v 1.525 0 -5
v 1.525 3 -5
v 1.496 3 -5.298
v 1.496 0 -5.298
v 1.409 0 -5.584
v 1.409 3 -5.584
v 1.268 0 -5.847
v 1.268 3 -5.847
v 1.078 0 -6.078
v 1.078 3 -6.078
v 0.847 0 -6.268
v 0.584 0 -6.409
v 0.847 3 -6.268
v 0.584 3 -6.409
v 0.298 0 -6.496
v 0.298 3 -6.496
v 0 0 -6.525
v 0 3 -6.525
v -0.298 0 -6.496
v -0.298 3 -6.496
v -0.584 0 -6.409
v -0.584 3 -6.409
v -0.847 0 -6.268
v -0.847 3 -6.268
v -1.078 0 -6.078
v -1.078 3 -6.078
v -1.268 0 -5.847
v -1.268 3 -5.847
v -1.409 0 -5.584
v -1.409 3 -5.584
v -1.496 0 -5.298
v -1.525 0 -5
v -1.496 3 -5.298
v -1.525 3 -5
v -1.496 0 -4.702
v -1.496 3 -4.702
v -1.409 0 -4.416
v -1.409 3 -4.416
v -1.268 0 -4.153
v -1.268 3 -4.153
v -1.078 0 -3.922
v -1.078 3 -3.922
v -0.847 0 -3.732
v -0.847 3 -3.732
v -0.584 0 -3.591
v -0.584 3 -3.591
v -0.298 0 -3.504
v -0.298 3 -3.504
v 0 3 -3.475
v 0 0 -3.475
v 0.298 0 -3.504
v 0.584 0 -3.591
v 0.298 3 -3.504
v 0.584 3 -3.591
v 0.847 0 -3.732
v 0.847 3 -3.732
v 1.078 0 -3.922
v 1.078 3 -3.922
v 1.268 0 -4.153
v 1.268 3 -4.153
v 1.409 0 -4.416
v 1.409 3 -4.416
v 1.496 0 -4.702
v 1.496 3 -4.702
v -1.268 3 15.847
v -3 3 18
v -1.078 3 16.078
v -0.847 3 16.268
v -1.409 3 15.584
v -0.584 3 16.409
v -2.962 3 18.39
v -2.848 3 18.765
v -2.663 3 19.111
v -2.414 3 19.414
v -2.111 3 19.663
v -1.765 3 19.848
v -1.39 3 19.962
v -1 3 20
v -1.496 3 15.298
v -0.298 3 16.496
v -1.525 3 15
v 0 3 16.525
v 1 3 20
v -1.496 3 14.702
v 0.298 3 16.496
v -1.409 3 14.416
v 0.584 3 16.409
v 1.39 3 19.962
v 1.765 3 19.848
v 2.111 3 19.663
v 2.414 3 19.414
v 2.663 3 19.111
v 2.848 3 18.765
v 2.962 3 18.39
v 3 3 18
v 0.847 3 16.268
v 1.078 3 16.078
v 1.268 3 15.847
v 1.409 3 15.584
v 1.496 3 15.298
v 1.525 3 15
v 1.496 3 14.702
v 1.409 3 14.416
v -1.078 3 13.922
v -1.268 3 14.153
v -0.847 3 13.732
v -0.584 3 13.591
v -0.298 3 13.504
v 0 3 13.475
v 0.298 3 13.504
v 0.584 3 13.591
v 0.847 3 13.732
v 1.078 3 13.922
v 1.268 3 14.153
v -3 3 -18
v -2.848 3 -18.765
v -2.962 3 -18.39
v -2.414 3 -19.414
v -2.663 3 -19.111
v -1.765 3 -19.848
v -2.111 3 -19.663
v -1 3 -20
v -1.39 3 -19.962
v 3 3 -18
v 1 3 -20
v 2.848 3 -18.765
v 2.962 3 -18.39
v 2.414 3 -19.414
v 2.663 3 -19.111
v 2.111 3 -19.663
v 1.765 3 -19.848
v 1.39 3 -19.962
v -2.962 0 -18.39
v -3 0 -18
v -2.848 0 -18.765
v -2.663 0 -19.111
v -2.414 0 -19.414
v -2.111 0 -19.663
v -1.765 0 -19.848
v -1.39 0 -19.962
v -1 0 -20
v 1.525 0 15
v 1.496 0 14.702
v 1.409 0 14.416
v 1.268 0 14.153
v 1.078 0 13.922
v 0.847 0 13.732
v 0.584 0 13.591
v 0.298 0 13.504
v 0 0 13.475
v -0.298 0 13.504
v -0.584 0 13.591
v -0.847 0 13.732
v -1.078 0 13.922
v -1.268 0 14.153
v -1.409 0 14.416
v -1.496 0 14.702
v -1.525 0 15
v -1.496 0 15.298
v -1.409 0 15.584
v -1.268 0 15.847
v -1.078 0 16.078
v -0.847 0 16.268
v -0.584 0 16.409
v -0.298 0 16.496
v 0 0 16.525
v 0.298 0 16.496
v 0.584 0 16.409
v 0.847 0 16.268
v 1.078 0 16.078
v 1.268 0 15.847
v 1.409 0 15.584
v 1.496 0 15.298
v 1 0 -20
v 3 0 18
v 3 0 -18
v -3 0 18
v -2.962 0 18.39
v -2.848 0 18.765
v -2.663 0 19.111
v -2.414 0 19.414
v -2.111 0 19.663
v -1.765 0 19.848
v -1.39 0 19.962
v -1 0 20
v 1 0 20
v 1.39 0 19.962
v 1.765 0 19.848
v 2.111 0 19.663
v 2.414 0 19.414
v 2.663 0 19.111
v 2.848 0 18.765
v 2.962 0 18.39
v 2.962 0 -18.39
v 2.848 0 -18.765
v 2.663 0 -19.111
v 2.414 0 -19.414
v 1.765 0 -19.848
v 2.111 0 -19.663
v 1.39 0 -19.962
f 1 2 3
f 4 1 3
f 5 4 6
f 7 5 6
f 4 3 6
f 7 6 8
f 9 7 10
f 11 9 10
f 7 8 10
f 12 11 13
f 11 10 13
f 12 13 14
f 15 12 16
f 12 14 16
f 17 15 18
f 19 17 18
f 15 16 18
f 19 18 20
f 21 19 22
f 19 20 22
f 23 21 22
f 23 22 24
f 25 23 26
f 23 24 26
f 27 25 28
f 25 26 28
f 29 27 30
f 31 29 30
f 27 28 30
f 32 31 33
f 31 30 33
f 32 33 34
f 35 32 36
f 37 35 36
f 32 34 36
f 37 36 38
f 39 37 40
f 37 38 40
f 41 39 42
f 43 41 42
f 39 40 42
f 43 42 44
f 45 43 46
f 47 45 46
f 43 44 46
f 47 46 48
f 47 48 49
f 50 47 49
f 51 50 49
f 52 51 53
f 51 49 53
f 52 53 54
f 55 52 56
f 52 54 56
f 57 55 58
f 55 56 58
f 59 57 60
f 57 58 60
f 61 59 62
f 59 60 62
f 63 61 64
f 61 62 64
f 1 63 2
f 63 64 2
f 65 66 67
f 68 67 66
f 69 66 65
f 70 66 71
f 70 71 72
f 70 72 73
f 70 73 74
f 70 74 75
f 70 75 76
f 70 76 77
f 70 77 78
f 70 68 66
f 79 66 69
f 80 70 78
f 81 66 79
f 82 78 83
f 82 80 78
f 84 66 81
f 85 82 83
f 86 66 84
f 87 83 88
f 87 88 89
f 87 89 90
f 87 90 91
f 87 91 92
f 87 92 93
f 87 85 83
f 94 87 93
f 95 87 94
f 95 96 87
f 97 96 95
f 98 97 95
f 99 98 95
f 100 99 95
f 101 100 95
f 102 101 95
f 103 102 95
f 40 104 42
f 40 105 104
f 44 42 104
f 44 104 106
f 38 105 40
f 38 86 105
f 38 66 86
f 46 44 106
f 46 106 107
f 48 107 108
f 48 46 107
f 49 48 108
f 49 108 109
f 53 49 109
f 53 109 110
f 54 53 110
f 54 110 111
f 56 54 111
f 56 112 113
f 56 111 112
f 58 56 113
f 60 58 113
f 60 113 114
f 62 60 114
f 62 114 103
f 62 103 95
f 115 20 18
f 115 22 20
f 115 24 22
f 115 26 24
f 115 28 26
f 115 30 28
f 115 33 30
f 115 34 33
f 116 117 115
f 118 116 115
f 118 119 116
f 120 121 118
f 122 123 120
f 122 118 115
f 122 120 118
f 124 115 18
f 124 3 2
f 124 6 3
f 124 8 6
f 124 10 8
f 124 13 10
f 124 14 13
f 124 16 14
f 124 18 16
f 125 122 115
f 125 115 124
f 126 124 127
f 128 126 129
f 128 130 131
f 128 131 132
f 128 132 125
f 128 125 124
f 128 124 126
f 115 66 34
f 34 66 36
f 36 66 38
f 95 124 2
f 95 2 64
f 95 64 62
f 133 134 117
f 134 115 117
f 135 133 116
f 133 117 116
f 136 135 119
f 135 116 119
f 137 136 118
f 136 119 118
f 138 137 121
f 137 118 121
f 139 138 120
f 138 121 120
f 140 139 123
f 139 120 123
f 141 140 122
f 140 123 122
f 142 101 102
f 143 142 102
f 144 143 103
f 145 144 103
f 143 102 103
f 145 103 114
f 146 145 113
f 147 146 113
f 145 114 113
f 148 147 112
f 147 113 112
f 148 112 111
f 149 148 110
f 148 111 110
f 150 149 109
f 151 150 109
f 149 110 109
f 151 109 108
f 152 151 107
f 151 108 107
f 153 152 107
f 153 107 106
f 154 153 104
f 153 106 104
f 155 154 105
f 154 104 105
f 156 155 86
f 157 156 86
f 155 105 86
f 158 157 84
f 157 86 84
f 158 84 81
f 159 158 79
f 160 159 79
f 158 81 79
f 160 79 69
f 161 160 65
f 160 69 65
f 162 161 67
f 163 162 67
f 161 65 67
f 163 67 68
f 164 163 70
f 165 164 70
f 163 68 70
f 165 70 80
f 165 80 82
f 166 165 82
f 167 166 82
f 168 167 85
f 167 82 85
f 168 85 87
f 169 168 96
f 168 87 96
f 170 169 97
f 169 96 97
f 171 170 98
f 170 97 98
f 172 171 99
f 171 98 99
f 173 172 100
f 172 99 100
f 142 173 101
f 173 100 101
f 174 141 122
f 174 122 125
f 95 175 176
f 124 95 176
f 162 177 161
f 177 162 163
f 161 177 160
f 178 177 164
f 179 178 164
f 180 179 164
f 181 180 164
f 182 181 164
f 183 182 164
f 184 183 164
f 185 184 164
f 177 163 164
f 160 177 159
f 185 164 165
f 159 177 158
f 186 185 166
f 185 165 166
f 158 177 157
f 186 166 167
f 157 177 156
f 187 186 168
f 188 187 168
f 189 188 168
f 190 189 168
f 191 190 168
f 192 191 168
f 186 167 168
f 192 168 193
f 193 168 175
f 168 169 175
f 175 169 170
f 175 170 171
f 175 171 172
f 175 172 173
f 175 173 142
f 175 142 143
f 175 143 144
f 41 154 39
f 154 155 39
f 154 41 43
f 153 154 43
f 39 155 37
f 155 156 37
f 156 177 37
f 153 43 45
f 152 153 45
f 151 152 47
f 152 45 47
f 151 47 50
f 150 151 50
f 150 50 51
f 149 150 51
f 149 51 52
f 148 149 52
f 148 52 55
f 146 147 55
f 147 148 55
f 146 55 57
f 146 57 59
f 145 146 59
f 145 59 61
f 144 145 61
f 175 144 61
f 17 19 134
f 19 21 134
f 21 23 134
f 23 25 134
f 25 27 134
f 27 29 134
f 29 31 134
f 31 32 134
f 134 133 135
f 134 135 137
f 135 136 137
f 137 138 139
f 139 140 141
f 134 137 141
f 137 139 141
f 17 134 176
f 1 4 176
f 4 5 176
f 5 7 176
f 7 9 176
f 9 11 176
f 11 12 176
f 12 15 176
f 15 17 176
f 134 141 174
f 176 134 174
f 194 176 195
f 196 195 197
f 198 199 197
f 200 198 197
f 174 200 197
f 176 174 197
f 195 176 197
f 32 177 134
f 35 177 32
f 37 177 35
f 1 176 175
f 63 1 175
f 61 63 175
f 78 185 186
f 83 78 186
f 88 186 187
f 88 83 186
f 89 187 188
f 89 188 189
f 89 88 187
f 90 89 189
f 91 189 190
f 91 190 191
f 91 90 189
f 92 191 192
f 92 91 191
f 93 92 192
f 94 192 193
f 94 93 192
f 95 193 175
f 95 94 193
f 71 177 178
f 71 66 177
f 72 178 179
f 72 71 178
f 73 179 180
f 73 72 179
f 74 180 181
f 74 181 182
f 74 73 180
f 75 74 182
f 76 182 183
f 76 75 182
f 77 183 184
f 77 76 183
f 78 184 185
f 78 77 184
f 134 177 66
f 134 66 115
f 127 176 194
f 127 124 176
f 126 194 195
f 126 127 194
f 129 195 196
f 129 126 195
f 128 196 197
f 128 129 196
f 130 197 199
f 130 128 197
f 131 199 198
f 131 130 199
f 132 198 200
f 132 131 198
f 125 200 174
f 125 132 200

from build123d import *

# Parameters (mm, degrees)
SKETCH_1_W          = 6
SKETCH_1_H          = 40
EXTRUDE_1_DEPTH     = 3
FILLET_1_R          = 2
SKETCH_2_R          = 1.525
CUT_EXTRUDE_1_DEPTH = 3


with BuildPart() as part:
    # 草图1 → 凸台-拉伸1 (new body)
    with BuildSketch(Plane(origin=(0, 0, 0), x_dir=(1, 0, 0), z_dir=(0, 1, 0))):
        Rectangle(SKETCH_1_W, SKETCH_1_H)
    extrude(amount=EXTRUDE_1_DEPTH)

    # 圆角1
    fillet_1_edges = [part.edges().sort_by_distance(p)[0] for p in [
        (3, 1.5, 20),
        (-3, 1.5, 20),
        (-3, 1.5, -20),
        (3, 1.5, -20),
    ]]
    fillet(fillet_1_edges, radius=FILLET_1_R)

    # 草图2 → 切除-拉伸1 (cut)
    with BuildSketch(Plane(origin=(0, 3, 0), x_dir=(1, 0, 0), z_dir=(0, 1, 0))):
        with Locations((0, 5)):
            Circle(SKETCH_2_R)
        with Locations((0, -15)):
            Circle(SKETCH_2_R)
    extrude(amount=-CUT_EXTRUDE_1_DEPTH, mode=Mode.SUBTRACT)


solid = part.part
